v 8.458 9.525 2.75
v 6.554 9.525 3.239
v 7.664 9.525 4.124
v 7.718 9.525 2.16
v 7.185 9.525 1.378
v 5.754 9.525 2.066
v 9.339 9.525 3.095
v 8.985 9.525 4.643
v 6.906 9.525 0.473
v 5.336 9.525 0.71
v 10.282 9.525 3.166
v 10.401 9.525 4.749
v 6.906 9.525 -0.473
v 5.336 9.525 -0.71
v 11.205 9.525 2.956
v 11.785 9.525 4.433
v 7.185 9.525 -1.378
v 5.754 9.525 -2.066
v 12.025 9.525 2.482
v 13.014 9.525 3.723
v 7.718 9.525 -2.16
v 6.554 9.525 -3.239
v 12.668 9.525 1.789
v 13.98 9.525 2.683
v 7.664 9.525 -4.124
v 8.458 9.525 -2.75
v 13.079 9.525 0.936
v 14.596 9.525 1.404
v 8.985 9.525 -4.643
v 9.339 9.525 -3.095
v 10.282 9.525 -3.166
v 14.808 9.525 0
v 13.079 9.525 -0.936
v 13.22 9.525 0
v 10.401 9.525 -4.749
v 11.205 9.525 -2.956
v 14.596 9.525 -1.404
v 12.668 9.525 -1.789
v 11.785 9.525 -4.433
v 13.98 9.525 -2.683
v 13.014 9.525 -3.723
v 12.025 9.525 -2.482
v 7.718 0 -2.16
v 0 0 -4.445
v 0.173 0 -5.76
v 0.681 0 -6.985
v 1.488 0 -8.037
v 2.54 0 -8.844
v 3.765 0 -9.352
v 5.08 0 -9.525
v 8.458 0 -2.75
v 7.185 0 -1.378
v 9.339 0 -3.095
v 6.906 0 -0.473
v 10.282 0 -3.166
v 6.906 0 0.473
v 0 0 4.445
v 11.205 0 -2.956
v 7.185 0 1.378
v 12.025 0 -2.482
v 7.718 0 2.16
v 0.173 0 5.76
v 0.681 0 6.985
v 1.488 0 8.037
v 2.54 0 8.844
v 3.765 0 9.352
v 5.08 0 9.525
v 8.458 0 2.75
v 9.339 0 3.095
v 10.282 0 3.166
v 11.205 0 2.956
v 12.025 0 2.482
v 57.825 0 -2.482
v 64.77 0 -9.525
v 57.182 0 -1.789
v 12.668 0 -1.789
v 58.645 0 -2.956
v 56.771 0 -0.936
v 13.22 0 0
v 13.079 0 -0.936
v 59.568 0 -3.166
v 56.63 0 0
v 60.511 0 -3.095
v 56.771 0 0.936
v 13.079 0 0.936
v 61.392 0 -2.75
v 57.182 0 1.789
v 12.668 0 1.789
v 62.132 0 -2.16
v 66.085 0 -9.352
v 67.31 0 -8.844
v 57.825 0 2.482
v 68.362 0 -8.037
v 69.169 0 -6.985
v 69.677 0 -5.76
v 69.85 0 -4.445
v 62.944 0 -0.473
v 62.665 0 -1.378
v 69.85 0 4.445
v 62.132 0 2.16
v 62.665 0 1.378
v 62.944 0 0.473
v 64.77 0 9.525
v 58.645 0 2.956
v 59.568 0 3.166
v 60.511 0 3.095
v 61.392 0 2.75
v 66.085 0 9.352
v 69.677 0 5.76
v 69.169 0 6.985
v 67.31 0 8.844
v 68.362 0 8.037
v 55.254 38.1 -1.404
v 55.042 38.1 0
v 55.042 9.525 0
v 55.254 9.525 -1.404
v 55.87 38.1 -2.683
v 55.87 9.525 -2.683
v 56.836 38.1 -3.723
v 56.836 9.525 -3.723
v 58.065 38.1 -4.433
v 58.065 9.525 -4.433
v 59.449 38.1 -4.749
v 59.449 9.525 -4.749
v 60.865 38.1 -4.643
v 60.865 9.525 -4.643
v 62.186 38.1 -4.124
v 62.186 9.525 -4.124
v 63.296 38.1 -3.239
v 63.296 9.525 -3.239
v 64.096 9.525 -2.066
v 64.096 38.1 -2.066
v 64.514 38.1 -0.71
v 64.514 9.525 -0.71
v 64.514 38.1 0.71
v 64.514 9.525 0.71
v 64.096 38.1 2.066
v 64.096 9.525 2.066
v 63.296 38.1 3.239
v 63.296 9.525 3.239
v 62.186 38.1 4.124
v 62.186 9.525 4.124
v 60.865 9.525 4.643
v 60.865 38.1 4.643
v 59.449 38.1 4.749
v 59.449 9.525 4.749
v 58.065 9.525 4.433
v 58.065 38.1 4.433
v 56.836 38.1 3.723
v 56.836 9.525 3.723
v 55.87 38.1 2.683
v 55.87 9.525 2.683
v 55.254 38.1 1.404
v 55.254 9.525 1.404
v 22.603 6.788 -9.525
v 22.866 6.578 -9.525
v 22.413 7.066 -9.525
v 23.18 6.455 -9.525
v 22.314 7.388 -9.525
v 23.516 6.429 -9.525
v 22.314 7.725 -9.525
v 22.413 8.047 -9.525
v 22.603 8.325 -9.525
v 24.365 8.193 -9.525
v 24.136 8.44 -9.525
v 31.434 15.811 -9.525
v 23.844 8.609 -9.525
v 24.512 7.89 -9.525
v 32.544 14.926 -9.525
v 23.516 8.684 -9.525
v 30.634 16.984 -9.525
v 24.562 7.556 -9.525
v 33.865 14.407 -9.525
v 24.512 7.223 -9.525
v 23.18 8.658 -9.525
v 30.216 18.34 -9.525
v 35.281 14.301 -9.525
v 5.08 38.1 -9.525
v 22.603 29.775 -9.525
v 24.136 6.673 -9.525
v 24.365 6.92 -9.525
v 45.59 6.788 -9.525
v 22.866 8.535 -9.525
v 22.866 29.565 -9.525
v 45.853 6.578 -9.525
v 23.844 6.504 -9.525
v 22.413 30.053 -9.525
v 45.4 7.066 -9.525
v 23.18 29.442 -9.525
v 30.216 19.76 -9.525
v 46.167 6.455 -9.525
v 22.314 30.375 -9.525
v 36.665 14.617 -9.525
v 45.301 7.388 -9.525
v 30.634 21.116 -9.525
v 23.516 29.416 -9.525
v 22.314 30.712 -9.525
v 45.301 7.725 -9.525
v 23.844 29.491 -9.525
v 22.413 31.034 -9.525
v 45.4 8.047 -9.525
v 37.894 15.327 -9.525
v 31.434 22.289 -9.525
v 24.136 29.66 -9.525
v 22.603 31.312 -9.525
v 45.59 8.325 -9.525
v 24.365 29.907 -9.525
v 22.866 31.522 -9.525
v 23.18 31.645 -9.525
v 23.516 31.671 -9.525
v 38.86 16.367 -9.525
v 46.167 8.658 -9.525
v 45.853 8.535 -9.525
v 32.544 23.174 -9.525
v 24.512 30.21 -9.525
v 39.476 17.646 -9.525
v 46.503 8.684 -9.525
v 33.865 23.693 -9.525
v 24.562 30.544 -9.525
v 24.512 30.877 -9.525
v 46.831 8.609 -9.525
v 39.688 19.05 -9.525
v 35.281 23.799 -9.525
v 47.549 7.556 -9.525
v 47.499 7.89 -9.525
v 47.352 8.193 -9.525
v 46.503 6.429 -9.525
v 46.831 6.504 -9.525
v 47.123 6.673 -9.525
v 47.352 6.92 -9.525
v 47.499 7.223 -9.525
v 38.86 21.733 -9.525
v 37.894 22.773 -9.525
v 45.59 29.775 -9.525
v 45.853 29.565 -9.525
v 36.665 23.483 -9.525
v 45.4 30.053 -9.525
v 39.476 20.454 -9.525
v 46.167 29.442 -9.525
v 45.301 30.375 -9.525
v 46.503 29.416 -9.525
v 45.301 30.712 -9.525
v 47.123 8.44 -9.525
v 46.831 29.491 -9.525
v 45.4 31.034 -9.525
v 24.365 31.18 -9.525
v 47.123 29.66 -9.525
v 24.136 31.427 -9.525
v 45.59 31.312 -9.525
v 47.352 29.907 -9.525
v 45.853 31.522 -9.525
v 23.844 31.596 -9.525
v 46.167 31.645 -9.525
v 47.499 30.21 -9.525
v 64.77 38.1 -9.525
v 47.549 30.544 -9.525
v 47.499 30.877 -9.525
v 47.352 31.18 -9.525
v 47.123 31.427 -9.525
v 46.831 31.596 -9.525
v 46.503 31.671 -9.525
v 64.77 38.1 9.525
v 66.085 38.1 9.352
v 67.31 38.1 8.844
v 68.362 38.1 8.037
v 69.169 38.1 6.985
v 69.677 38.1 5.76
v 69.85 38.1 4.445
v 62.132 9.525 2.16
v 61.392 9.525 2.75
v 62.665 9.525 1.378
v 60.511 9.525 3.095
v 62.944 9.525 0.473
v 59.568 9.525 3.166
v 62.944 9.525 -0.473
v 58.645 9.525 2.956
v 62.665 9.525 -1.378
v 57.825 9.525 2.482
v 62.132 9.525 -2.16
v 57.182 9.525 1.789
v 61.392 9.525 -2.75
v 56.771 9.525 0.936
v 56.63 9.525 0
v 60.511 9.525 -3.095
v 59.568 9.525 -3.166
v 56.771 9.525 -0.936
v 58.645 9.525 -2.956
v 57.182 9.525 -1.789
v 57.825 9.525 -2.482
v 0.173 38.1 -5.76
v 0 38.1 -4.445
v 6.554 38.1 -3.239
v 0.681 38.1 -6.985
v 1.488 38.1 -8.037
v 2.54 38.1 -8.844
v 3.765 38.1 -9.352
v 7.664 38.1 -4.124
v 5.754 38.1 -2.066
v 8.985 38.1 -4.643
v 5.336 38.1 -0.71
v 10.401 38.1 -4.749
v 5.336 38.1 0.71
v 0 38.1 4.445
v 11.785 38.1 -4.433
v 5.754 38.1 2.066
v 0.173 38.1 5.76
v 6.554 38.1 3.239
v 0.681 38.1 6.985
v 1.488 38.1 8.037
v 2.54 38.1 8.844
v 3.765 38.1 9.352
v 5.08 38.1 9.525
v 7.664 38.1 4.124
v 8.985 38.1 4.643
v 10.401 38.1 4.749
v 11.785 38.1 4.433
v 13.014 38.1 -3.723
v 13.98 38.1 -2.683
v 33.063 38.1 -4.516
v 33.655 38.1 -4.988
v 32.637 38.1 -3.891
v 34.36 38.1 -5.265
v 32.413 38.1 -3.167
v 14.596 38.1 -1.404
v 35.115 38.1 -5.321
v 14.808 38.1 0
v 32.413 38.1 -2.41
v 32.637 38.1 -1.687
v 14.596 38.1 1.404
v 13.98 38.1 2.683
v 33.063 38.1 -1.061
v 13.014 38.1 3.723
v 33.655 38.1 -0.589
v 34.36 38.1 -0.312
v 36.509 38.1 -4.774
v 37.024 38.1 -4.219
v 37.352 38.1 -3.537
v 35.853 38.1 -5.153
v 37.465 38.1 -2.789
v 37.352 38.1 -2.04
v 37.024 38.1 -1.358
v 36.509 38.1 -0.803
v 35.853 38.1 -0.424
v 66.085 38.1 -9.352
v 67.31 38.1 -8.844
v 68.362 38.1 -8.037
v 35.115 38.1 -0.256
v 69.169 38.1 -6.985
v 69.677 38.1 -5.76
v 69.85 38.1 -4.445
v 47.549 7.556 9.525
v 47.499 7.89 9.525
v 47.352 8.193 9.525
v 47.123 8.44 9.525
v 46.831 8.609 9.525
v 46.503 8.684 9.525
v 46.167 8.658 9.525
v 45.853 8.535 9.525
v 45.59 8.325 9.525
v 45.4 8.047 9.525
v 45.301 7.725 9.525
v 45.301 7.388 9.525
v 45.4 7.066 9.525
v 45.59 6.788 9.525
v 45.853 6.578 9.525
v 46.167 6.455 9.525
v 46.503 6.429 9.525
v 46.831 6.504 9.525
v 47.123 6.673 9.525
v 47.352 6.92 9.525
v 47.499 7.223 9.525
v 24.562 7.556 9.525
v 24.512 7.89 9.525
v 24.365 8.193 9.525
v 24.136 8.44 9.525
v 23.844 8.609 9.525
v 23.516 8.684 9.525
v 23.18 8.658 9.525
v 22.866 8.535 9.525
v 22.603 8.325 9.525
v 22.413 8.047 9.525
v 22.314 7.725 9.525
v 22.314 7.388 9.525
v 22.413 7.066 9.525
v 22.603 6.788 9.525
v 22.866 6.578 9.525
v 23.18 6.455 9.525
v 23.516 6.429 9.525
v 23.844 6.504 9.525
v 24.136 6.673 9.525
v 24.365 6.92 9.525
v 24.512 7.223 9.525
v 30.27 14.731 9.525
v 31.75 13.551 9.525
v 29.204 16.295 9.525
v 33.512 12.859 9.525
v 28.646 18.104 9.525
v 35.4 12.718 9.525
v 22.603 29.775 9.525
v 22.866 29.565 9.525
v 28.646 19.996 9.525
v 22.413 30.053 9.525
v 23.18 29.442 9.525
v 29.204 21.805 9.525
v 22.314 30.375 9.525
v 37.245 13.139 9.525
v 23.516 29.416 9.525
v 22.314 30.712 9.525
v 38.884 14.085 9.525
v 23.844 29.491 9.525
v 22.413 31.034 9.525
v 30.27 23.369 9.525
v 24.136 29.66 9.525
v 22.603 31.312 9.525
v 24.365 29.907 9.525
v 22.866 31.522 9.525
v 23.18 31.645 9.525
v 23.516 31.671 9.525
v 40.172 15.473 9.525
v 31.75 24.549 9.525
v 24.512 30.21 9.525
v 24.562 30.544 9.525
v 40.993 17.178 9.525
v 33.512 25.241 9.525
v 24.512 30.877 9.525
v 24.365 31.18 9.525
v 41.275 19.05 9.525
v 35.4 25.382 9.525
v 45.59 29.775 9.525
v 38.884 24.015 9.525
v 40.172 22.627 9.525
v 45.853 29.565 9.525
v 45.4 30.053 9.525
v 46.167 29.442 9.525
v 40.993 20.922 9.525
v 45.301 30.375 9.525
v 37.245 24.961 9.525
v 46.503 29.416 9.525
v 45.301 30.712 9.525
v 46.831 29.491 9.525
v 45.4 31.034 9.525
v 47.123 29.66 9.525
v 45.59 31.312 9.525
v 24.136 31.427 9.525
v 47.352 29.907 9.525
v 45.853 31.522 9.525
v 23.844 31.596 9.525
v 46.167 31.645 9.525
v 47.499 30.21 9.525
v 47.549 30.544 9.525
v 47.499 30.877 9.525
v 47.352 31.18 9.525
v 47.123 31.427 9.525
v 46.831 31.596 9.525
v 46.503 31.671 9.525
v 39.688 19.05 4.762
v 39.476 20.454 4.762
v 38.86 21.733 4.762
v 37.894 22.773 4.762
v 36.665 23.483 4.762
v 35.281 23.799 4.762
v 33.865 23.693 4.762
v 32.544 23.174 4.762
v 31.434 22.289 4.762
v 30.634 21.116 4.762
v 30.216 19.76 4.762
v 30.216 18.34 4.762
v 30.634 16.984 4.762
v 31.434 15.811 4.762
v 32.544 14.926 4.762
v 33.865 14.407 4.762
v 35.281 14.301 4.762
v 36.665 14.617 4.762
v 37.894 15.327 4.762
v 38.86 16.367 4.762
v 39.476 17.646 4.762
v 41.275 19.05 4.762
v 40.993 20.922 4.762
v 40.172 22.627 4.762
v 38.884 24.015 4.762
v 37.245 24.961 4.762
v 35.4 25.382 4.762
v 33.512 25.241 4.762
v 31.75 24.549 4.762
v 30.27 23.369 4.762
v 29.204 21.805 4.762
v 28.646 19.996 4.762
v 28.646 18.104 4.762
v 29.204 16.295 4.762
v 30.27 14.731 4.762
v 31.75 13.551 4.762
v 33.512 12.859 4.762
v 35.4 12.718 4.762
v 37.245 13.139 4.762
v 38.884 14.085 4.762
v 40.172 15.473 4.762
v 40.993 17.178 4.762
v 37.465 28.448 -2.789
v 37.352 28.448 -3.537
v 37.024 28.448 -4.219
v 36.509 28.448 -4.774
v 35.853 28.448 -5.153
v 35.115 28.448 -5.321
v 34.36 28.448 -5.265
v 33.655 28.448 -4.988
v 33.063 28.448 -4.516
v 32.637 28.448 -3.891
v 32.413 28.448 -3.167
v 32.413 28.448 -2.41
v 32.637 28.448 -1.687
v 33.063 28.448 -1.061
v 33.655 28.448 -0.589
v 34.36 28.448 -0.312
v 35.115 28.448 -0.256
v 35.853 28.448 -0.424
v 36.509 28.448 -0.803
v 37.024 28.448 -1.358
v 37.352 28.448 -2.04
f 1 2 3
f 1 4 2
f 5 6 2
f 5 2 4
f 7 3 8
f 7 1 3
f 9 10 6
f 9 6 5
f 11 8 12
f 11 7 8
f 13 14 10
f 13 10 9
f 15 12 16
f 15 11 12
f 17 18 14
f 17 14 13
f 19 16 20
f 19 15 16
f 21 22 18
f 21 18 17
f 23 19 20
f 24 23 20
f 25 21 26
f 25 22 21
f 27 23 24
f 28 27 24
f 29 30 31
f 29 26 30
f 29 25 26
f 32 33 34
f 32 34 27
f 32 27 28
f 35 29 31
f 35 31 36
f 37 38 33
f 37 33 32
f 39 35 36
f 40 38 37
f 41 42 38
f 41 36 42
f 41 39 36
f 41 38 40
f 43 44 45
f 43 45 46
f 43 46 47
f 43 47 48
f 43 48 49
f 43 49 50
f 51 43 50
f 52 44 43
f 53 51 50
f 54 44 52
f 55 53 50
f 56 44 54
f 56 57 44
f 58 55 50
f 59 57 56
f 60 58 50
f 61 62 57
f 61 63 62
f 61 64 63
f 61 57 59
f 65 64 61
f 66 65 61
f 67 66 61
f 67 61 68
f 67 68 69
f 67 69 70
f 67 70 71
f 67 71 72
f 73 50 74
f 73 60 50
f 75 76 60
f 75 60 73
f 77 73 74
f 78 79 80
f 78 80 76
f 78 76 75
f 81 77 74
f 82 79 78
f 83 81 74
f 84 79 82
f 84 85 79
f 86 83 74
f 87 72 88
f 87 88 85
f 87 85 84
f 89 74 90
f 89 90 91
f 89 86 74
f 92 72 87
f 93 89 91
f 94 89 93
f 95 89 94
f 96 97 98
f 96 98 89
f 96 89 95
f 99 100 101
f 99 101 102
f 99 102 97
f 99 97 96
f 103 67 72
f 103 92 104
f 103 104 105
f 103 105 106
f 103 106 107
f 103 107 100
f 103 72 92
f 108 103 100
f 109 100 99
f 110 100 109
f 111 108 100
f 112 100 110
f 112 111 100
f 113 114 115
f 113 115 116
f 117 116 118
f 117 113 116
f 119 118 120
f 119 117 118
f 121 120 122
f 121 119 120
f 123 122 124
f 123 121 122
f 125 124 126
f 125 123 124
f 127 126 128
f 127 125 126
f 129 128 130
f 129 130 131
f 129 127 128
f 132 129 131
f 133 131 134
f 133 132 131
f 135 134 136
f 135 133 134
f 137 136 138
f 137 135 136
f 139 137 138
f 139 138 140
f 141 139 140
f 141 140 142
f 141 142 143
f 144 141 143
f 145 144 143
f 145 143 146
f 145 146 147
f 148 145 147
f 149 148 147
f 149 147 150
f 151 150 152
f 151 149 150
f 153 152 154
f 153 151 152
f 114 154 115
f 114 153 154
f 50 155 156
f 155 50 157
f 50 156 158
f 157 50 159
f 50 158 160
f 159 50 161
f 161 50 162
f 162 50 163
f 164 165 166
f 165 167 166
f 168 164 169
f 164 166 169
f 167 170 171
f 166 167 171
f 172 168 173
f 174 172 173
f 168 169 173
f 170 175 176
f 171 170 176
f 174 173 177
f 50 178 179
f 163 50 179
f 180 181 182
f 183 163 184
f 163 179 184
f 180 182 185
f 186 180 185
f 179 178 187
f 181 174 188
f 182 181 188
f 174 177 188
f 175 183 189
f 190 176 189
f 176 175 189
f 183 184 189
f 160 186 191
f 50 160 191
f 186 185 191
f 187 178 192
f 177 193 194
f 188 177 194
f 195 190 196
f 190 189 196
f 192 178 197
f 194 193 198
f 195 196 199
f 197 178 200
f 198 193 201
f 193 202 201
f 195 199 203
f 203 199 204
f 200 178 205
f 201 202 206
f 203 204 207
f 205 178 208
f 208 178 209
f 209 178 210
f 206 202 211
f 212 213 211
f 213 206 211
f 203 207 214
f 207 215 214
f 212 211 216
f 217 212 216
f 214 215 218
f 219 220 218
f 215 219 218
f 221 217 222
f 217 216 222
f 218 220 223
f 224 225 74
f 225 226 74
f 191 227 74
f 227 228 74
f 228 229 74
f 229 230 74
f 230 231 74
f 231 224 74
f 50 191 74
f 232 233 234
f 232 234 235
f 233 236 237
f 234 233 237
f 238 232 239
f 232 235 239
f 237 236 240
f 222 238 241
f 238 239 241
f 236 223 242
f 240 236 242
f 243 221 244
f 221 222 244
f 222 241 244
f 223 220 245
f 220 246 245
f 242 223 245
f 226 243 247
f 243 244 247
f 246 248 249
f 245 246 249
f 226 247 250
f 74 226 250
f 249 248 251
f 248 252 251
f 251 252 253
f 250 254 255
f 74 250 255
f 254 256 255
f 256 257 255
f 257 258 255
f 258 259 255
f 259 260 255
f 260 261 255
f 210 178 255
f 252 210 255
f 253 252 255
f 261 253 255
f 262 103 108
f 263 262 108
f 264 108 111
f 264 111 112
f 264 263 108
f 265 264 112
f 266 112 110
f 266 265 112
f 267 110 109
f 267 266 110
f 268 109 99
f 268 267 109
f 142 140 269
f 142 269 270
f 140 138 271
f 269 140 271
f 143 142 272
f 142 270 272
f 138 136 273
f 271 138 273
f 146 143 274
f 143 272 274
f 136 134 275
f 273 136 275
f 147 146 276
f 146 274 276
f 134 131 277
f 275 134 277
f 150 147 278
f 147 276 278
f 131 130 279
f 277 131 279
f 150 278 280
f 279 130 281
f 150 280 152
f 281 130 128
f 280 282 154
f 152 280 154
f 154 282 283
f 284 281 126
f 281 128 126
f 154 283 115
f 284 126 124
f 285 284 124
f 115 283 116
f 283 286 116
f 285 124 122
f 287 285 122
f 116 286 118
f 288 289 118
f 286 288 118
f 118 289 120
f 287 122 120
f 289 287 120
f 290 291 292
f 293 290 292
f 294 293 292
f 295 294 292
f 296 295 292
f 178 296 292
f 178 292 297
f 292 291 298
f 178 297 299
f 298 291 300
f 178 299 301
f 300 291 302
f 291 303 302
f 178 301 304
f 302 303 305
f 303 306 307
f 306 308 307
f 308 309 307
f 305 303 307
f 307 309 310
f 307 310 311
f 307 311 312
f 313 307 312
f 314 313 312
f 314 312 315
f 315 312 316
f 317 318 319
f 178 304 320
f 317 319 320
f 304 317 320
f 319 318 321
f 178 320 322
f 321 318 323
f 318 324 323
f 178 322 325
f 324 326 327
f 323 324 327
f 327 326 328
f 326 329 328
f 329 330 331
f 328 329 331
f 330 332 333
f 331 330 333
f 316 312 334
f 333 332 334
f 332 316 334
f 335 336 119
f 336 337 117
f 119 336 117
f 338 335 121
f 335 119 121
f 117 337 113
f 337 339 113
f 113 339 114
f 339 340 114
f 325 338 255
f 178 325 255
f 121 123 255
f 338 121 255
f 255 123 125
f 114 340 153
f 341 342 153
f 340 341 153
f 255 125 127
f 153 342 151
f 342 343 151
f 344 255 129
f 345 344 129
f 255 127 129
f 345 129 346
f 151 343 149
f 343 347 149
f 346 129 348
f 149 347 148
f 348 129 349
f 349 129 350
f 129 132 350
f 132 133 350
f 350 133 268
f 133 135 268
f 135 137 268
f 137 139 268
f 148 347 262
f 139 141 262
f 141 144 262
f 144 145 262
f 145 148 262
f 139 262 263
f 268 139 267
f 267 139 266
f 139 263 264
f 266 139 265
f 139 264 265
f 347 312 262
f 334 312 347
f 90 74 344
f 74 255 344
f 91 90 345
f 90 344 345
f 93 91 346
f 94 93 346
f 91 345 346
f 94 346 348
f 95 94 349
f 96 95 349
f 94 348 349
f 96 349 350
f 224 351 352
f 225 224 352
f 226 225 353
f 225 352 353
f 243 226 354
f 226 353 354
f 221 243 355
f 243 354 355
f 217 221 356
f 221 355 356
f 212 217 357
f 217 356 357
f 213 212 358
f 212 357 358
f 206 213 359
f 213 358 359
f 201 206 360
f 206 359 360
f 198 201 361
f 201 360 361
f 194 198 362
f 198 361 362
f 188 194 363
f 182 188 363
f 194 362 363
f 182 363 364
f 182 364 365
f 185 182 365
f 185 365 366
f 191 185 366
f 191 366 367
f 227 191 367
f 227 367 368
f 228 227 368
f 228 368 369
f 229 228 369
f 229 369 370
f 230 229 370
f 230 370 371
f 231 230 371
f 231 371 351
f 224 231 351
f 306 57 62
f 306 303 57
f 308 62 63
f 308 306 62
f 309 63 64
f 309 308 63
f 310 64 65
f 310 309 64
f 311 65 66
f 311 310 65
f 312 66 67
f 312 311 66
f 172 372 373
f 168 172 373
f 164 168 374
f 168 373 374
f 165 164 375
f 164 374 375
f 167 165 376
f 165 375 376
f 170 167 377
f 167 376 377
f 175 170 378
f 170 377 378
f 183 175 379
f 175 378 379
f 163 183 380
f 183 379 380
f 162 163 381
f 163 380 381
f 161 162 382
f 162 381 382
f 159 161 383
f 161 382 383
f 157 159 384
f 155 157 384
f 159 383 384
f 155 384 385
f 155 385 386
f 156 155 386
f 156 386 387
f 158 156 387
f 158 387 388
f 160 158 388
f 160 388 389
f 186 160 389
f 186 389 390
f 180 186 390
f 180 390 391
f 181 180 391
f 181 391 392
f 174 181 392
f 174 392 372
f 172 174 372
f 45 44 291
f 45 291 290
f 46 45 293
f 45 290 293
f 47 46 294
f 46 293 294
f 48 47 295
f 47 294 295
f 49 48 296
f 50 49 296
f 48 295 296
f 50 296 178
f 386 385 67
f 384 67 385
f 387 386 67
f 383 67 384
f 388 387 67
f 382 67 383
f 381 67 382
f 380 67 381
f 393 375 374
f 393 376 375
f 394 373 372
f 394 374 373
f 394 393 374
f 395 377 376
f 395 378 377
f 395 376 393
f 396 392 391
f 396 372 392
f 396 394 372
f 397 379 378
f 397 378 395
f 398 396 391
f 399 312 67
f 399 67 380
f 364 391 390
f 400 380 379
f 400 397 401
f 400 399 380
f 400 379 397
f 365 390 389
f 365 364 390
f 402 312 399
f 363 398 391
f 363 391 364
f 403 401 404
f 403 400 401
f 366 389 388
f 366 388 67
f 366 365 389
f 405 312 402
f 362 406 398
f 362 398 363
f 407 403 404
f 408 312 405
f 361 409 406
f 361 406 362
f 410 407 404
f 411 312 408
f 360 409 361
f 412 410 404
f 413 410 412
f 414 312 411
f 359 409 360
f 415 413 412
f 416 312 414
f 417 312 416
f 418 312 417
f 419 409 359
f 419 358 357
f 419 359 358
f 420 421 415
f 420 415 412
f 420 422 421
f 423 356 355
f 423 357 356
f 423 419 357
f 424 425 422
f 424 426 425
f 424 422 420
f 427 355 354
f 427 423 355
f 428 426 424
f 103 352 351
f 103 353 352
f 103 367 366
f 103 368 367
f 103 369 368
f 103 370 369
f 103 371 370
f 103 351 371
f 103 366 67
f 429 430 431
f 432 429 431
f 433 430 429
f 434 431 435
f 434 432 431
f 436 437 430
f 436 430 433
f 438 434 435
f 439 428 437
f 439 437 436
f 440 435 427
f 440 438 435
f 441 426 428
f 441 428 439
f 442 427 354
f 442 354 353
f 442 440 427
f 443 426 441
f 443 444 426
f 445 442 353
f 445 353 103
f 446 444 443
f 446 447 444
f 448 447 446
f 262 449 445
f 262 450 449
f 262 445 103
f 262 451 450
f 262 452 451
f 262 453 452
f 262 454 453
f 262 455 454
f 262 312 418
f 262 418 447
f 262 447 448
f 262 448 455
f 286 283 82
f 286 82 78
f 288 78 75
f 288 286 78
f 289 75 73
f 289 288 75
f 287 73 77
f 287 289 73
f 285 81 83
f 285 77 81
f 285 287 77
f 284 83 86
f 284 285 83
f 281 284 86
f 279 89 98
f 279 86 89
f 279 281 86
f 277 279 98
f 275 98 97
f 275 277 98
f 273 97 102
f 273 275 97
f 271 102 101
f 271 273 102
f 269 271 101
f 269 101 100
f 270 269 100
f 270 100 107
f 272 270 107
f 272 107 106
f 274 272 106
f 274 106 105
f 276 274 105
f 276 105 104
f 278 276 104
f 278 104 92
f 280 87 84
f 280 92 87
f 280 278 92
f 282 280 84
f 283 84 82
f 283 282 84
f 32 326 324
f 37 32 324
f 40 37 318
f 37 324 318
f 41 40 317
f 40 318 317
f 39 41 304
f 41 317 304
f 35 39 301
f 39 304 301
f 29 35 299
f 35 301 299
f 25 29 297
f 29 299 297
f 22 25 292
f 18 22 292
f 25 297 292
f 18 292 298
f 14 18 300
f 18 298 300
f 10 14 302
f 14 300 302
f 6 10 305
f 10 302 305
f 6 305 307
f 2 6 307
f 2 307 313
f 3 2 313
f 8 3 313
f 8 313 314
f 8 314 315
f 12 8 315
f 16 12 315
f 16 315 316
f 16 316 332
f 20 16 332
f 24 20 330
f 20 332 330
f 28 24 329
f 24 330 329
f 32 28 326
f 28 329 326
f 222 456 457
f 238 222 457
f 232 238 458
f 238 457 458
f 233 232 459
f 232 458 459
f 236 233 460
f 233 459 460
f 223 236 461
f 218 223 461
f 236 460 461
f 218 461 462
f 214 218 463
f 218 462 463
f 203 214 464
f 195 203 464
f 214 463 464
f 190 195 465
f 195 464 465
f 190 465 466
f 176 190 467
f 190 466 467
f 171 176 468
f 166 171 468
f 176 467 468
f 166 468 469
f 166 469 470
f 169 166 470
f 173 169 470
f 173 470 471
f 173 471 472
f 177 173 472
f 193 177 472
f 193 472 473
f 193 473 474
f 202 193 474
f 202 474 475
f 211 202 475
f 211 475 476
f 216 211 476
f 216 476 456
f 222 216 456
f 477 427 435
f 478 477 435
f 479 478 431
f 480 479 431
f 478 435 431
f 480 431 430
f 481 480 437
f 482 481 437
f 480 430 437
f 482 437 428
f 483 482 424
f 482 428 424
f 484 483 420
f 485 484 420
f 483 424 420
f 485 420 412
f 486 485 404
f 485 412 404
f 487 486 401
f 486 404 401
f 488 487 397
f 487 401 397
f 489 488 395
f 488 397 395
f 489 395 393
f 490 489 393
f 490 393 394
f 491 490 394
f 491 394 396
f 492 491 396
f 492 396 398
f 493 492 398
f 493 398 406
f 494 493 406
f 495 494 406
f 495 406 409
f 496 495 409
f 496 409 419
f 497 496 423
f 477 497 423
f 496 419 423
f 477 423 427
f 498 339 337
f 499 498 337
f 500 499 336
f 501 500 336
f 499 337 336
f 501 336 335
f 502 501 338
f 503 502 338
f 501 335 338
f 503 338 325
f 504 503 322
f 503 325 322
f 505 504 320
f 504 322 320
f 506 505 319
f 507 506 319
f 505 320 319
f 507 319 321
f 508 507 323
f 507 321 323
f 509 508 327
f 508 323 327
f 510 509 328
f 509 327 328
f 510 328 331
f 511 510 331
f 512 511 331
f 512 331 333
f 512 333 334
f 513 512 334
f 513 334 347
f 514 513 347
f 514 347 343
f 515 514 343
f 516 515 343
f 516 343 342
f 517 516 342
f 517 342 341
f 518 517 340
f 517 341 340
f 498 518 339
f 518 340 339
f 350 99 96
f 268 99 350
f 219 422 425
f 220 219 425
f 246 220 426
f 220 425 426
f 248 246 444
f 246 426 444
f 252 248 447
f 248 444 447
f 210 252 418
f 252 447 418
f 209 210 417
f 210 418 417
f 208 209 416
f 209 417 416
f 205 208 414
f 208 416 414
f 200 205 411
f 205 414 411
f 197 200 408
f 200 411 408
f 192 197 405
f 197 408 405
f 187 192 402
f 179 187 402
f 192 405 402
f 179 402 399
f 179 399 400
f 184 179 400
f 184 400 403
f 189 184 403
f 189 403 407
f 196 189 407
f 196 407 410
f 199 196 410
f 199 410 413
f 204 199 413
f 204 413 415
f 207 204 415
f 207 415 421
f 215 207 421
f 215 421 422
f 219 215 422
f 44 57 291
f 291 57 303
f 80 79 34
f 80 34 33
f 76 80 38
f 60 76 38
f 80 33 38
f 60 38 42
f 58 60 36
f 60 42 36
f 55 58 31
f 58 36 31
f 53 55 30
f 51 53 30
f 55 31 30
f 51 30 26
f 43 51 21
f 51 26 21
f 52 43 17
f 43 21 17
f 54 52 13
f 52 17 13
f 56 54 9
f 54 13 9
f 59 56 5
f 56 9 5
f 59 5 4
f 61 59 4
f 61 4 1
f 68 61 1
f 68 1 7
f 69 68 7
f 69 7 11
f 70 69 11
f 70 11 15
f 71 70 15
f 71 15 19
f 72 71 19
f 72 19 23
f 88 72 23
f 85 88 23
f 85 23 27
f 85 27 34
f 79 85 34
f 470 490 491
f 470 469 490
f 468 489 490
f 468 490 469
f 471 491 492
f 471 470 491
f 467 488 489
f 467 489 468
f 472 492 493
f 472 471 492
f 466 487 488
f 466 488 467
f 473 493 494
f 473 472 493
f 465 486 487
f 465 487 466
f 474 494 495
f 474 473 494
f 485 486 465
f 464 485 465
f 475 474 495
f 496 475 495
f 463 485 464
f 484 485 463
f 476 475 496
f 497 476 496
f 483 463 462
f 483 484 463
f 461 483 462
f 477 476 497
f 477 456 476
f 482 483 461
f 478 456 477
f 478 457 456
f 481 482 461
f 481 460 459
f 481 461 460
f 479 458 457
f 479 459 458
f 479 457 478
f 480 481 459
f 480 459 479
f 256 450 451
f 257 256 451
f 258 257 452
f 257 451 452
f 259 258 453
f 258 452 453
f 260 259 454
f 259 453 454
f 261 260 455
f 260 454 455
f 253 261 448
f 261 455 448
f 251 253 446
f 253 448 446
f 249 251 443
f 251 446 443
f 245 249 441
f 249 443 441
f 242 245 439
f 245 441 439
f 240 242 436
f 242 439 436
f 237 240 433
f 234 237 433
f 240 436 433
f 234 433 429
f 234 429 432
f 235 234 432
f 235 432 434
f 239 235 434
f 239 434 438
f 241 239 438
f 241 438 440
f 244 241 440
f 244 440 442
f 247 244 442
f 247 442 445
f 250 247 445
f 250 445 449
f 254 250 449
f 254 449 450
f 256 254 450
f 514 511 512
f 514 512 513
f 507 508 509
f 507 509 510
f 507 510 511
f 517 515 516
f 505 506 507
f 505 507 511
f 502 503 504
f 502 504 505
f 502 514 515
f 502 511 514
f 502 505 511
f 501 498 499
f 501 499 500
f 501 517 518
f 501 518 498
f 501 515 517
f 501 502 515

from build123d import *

# Parameters (mm, degrees)
SKETCH1_W           = 69.85
SKETCH1_H           = 38.1
BOSS_EXTRUDE1_DEPTH = 9.525
SKETCH2_R           = 6.35
CUT_EXTRUDE1_DEPTH  = 4.7625
SKETCH3_R           = 4.7625
CUT_EXTRUDE2_DEPTH  = 20.05
SKETCH4_R           = 1.1303
CUT_EXTRUDE3_DEPTH  = 20.05
SKETCH6_R           = 3.175
CUT_EXTRUDE4_DEPTH  = 39.1
SKETCH7_R           = 4.7625
CUT_EXTRUDE5_DEPTH  = 28.575
SKETCH8_R           = 2.54
CUT_EXTRUDE6_DEPTH  = 9.652
FILLET1_R           = 5.08


with BuildPart() as part:
    # Sketch1 → Boss-Extrude1 (new body, symmetric)
    with BuildSketch(Plane.XY):
        with Locations((34.925, 19.05)):
            Rectangle(SKETCH1_W, SKETCH1_H)
    extrude(amount=BOSS_EXTRUDE1_DEPTH, both=True)

    # Sketch2 → Cut-Extrude1 (cut)
    with BuildSketch(Plane.XY.offset(9.525)):
        with Locations((34.925, 19.05)):
            Circle(SKETCH2_R)
    extrude(amount=-CUT_EXTRUDE1_DEPTH, mode=Mode.SUBTRACT)

    # Sketch3 → Cut-Extrude2 (cut, through all)
    with BuildSketch(Plane.XY.offset(9.525)):
        with Locations((34.925, 19.05)):
            Circle(SKETCH3_R)
    extrude(amount=-CUT_EXTRUDE2_DEPTH, mode=Mode.SUBTRACT)

    # Sketch4 → Cut-Extrude3 (cut, through all)
    with BuildSketch(Plane.XY.offset(9.525)):
        with Locations((23.4315, 30.5435)):
            Circle(SKETCH4_R)
        with Locations((46.4185, 30.5435)):
            Circle(SKETCH4_R)
        with Locations((46.4185, 7.5565)):
            Circle(SKETCH4_R)
        with Locations((23.4315, 7.5565)):
            Circle(SKETCH4_R)
    extrude(amount=-CUT_EXTRUDE3_DEPTH, mode=Mode.SUBTRACT)

    # Sketch6 → Cut-Extrude4 (cut, through all)
    with BuildSketch(Plane(origin=(0, 38.1, 0), x_dir=(1, 0, 0), z_dir=(0, 1, 0))):
        with Locations((10.045078415, 0)):
            Circle(SKETCH6_R)
    cut_extrude4 = extrude(amount=-CUT_EXTRUDE4_DEPTH, mode=Mode.SUBTRACT)

    # Sketch7 → Cut-Extrude5 (cut)
    with BuildSketch(Plane(origin=(0, 38.1, 0), x_dir=(1, 0, 0), z_dir=(0, 1, 0))):
        with Locations((10.045078415, 0)):
            Circle(SKETCH7_R)
    cut_extrude5 = extrude(amount=-CUT_EXTRUDE5_DEPTH, mode=Mode.SUBTRACT)

    # Mirror1: Cut-Extrude4, Cut-Extrude5 across plane
    add(cut_extrude4.mirror(Plane.ZY.offset(-34.925)), mode=Mode.SUBTRACT)
    add(cut_extrude5.mirror(Plane.ZY.offset(-34.925)), mode=Mode.SUBTRACT)

    # Sketch8 → Cut-Extrude6 (cut)
    with BuildSketch(Plane(origin=(0, 38.1, 0), x_dir=(1, 0, 0), z_dir=(0, 1, 0))):
        with Locations((34.925, 2.788579275)):
            Circle(SKETCH8_R)
    extrude(amount=-CUT_EXTRUDE6_DEPTH, mode=Mode.SUBTRACT)

    # Fillet1
    fillet1_edges = [part.edges().sort_by_distance(p)[0] for p in [
        (69.85, 19.05, 9.525),
        (0, 19.05, 9.525),
        (69.85, 19.05, -9.525),
        (0, 19.05, -9.525),
    ]]
    fillet(fillet1_edges, radius=FILLET1_R)


solid = part.part
